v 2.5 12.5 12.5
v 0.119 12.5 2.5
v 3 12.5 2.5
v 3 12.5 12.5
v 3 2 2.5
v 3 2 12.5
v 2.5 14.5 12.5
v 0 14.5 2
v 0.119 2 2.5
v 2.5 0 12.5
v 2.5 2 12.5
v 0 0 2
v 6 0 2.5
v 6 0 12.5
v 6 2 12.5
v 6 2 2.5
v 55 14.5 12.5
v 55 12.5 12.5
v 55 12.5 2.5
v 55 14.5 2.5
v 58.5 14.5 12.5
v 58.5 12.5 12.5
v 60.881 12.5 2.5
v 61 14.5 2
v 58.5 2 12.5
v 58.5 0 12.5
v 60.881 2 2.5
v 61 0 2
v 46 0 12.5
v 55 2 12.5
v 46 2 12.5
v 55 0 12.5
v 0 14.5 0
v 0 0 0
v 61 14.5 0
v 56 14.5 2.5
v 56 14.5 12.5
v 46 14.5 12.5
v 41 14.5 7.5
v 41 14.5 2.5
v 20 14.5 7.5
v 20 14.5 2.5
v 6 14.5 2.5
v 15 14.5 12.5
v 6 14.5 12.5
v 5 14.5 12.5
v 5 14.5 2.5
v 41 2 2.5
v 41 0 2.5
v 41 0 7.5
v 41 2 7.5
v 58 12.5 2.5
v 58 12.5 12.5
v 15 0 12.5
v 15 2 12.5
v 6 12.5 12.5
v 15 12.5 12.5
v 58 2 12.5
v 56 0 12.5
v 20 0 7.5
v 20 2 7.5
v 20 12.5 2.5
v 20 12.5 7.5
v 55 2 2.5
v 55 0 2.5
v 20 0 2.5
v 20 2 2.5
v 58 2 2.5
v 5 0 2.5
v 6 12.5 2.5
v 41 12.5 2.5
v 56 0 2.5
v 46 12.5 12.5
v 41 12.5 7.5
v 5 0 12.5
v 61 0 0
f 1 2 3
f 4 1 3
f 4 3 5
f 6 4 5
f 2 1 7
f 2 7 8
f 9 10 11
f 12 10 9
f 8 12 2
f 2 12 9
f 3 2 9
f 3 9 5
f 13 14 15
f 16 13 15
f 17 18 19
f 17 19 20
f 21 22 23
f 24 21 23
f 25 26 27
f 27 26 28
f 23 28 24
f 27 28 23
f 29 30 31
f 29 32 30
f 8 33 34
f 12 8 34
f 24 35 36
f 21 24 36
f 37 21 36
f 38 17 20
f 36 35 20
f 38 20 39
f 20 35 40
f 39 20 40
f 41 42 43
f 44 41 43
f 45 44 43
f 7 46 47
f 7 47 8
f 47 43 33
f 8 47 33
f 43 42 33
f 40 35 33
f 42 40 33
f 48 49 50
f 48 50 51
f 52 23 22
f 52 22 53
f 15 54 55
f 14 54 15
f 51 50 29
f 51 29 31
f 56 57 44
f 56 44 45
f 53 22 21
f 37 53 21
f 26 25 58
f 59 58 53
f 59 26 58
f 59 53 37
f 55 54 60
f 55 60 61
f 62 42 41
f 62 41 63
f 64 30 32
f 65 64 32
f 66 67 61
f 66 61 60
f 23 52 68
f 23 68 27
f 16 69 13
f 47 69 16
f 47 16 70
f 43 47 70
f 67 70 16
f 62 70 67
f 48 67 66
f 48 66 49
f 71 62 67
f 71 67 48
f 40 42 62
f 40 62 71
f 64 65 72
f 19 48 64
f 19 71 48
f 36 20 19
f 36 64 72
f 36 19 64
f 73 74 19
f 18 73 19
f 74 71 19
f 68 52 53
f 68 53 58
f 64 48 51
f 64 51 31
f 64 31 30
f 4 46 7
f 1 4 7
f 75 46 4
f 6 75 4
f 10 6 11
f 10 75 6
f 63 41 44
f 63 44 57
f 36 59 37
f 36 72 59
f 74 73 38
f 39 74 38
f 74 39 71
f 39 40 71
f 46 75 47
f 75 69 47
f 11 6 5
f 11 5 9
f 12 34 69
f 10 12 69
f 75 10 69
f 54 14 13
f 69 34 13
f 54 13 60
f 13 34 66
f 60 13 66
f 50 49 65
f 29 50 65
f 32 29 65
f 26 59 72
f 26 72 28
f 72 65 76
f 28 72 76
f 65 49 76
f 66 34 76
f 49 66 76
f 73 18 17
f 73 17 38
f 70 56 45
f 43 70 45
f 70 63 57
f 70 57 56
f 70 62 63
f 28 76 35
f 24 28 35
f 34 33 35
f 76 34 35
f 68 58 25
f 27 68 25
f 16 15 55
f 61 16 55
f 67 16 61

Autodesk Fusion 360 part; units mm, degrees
sketch "Sketch1" plane through (0, 0, 0) normal (0, 0, 1) x (1, 0, 0)
  line L0 (0, 0) -> (61, 0)
  line L1 (61, 0) -> (61, 14.5)
  line L2 (61, 14.5) -> (0, 14.5)
  line L3 (0, 14.5) -> (0, 0)
  dimension "d1" = 61
  dimension "d2" = 14.5
extrude "Extrude1" add sketch "Sketch1" along normal blind 2.5
sketch "Sketch2" plane through (0, 0, 2.5) normal (0, 0, 1) x (-1, 0, 0)
  line L0 (0, -14.5) -> (0, 0)
  line L1 (0, 0) -> (-61, 0)
  line L2 (-61, 0) -> (-61, -14.5)
  line L3 (-61, -14.5) -> (0, -14.5)
  line L4 (-5, -24.7983) -> (-5, 20) construction
  line L5 (-56, -25) -> (-56, 25) construction
  line L6 (12, -12.5) -> (-78, -12.5) construction
  line L7 (12, -2) -> (-79, -2) construction
  line L8 (-5, -14.5) -> (-3, -14.5)
  line L9 (-3, -14.5) -> (-3, 0)
  line L10 (-3, 0) -> (-5, 0)
  line L11 (-5, 0) -> (-5, -14.5)
  line L12 (-56, -14.5) -> (-58, -14.5)
  line L13 (-58, -14.5) -> (-58, 0)
  line L14 (-58, 0) -> (-56, 0)
  line L15 (-56, 0) -> (-56, -14.5)
  line L16 (-6, -14.5) -> (-20, -14.5)
  line L17 (-20, -14.5) -> (-20, -12.5)
  line L18 (-20, -12.5) -> (-6, -12.5)
  line L19 (-6, -12.5) -> (-6, -14.5)
  line L20 (-6, -2) -> (-20, -2)
  line L21 (-20, -2) -> (-20, 0)
  line L22 (-20, 0) -> (-6, 0)
  line L23 (-6, 0) -> (-6, -2)
  line L24 (-55, -14.5) -> (-41, -14.5)
  line L25 (-41, -14.5) -> (-41, -12.5)
  line L26 (-41, -12.5) -> (-55, -12.5)
  line L27 (-55, -12.5) -> (-55, -14.5)
  line L28 (-41, -2) -> (-55, -2)
  line L29 (-55, -2) -> (-55, 0)
  line L30 (-55, 0) -> (-41, 0)
  line L31 (-41, 0) -> (-41, -2)
  line L32 (-3, -14.5) -> (0, -14.5)
  line L33 (0, -14.5) -> (0, -12.5)
  line L34 (0, -12.5) -> (-3, -12.5)
  line L35 (-3, -12.5) -> (-3, -14.5)
  line L36 (-58, -14.5) -> (-61, -14.5)
  line L37 (-61, -14.5) -> (-61, -12.5)
  line L38 (-61, -12.5) -> (-58, -12.5)
  line L39 (-58, -12.5) -> (-58, -14.5)
  line L40 (-58, -2) -> (-61, -2)
  line L41 (-61, -2) -> (-61, 0)
  line L42 (-61, 0) -> (-58, 0)
  line L43 (-58, 0) -> (-58, -2)
  line L44 (-3, -2) -> (0, -2)
  line L45 (0, -2) -> (0, 0)
  line L46 (0, 0) -> (-3, 0)
  line L47 (-3, 0) -> (-3, -2)
  dimension "d5" = 51
  dimension "d6" = 5
  dimension "d7" = 10.5
  dimension "d8" = 2
  dimension "d9" = 14
  dimension "d10" = 14
  dimension "d11" = 14
  dimension "d12" = 14
  dimension "d13" = 1
  dimension "d14" = 1
  dimension "d15" = 1
  dimension "d16" = 1
extrude "Extrude2" add sketch "Sketch2" along normal blind 10 contours L0 L3 L9 L32 L33 L34 L35 | L1 L3 L8 L9 L10 L11 L35 L47 | L0 L1 L9 L44 L45 L46 L47 | L3 L16 L17 L18 L19 | L1 L20 L21 L22 L23 | L3 L24 L25 L26 L27 | L1 L28 L29 L30 L31 | L1 L3 L12 L13 L14 L15 L39 L43 | L2 L3 L13 L36 L37 L38 L39 | L1 L2 L13 L40 L41 L42 L43
sketch "Sketch3" plane through (0, 0, 0) normal (0, -1, 0) x (1, 0, 0)
  line L0 (0, 0) -> (61, 0)
  line L1 (61, 0) -> (61, 12.5)
  line L2 (61, 12.5) -> (56, 12.5)
  line L3 (56, 12.5) -> (56, 2.5)
  line L4 (56, 2.5) -> (55, 2.5)
  line L5 (55, 2.5) -> (55, 12.5)
  line L6 (55, 12.5) -> (41, 12.5)
  line L7 (41, 12.5) -> (41, 2.5)
  line L8 (41, 2.5) -> (20, 2.5)
  line L9 (20, 2.5) -> (20, 12.5)
  line L10 (20, 12.5) -> (6, 12.5)
  line L11 (6, 12.5) -> (6, 2.5)
  line L12 (6, 2.5) -> (5, 2.5)
  line L13 (5, 2.5) -> (5, 12.5)
  line L14 (5, 12.5) -> (0, 12.5)
  line L15 (0, 12.5) -> (0, 0)
  line L16 (2.5, 12.5) -> (0, 2)
  line L17 (0, 12.5) -> (0, 2)
  line L18 (0, 12.5) -> (2.5, 12.5)
  line L19 (58.5, 12.5) -> (61, 2)
  line L20 (61, 2) -> (61, 12.5)
  line L21 (61, 12.5) -> (58.5, 12.5)
extrude "Extrude3" cut sketch "Sketch3" against normal blind 68 contours L14 L15 L16 L17 L18 | L1 L2 L19 L20 L21
chamfer "Chamfer1" distance 5 angle 45 4 edges at (20, 13.5, 12.5) (41, 13.5, 12.5) (41, 1, 12.5) (20, 1, 12.5)
